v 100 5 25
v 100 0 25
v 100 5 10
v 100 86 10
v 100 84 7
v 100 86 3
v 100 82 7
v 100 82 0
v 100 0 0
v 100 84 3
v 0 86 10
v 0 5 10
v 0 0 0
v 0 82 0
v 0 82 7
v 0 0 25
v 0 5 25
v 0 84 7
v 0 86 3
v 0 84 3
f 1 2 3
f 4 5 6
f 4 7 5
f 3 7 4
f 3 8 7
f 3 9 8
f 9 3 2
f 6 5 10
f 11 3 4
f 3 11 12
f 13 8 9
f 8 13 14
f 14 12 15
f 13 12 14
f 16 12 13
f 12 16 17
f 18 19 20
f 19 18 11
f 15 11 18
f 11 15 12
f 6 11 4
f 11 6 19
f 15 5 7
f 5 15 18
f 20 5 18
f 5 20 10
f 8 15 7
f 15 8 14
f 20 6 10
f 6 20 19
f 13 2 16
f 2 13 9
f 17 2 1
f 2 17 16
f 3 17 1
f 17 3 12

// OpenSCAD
WideX=100;
DepthY=80;
HightY=10;
SlotThick=2;
SlotH=8;
Buff=1;
HangAdd=6;
HangCut=4;
BrimThick=5;
BrimH=25;
DB=Buff*2;

cube([WideX,DepthY,HightY]);
cube([WideX,BrimThick,BrimH]);
difference()
{
  translate([0,DepthY,0]) cube([WideX,HangAdd,HightY]);
  translate([-Buff,DepthY+SlotThick,-Buff]) cube([WideX+DB,SlotThick,SlotH]);
  translate([-Buff,DepthY+Buff+SlotThick,-Buff]) cube([WideX+DB,HangAdd,HangCut]);
}
